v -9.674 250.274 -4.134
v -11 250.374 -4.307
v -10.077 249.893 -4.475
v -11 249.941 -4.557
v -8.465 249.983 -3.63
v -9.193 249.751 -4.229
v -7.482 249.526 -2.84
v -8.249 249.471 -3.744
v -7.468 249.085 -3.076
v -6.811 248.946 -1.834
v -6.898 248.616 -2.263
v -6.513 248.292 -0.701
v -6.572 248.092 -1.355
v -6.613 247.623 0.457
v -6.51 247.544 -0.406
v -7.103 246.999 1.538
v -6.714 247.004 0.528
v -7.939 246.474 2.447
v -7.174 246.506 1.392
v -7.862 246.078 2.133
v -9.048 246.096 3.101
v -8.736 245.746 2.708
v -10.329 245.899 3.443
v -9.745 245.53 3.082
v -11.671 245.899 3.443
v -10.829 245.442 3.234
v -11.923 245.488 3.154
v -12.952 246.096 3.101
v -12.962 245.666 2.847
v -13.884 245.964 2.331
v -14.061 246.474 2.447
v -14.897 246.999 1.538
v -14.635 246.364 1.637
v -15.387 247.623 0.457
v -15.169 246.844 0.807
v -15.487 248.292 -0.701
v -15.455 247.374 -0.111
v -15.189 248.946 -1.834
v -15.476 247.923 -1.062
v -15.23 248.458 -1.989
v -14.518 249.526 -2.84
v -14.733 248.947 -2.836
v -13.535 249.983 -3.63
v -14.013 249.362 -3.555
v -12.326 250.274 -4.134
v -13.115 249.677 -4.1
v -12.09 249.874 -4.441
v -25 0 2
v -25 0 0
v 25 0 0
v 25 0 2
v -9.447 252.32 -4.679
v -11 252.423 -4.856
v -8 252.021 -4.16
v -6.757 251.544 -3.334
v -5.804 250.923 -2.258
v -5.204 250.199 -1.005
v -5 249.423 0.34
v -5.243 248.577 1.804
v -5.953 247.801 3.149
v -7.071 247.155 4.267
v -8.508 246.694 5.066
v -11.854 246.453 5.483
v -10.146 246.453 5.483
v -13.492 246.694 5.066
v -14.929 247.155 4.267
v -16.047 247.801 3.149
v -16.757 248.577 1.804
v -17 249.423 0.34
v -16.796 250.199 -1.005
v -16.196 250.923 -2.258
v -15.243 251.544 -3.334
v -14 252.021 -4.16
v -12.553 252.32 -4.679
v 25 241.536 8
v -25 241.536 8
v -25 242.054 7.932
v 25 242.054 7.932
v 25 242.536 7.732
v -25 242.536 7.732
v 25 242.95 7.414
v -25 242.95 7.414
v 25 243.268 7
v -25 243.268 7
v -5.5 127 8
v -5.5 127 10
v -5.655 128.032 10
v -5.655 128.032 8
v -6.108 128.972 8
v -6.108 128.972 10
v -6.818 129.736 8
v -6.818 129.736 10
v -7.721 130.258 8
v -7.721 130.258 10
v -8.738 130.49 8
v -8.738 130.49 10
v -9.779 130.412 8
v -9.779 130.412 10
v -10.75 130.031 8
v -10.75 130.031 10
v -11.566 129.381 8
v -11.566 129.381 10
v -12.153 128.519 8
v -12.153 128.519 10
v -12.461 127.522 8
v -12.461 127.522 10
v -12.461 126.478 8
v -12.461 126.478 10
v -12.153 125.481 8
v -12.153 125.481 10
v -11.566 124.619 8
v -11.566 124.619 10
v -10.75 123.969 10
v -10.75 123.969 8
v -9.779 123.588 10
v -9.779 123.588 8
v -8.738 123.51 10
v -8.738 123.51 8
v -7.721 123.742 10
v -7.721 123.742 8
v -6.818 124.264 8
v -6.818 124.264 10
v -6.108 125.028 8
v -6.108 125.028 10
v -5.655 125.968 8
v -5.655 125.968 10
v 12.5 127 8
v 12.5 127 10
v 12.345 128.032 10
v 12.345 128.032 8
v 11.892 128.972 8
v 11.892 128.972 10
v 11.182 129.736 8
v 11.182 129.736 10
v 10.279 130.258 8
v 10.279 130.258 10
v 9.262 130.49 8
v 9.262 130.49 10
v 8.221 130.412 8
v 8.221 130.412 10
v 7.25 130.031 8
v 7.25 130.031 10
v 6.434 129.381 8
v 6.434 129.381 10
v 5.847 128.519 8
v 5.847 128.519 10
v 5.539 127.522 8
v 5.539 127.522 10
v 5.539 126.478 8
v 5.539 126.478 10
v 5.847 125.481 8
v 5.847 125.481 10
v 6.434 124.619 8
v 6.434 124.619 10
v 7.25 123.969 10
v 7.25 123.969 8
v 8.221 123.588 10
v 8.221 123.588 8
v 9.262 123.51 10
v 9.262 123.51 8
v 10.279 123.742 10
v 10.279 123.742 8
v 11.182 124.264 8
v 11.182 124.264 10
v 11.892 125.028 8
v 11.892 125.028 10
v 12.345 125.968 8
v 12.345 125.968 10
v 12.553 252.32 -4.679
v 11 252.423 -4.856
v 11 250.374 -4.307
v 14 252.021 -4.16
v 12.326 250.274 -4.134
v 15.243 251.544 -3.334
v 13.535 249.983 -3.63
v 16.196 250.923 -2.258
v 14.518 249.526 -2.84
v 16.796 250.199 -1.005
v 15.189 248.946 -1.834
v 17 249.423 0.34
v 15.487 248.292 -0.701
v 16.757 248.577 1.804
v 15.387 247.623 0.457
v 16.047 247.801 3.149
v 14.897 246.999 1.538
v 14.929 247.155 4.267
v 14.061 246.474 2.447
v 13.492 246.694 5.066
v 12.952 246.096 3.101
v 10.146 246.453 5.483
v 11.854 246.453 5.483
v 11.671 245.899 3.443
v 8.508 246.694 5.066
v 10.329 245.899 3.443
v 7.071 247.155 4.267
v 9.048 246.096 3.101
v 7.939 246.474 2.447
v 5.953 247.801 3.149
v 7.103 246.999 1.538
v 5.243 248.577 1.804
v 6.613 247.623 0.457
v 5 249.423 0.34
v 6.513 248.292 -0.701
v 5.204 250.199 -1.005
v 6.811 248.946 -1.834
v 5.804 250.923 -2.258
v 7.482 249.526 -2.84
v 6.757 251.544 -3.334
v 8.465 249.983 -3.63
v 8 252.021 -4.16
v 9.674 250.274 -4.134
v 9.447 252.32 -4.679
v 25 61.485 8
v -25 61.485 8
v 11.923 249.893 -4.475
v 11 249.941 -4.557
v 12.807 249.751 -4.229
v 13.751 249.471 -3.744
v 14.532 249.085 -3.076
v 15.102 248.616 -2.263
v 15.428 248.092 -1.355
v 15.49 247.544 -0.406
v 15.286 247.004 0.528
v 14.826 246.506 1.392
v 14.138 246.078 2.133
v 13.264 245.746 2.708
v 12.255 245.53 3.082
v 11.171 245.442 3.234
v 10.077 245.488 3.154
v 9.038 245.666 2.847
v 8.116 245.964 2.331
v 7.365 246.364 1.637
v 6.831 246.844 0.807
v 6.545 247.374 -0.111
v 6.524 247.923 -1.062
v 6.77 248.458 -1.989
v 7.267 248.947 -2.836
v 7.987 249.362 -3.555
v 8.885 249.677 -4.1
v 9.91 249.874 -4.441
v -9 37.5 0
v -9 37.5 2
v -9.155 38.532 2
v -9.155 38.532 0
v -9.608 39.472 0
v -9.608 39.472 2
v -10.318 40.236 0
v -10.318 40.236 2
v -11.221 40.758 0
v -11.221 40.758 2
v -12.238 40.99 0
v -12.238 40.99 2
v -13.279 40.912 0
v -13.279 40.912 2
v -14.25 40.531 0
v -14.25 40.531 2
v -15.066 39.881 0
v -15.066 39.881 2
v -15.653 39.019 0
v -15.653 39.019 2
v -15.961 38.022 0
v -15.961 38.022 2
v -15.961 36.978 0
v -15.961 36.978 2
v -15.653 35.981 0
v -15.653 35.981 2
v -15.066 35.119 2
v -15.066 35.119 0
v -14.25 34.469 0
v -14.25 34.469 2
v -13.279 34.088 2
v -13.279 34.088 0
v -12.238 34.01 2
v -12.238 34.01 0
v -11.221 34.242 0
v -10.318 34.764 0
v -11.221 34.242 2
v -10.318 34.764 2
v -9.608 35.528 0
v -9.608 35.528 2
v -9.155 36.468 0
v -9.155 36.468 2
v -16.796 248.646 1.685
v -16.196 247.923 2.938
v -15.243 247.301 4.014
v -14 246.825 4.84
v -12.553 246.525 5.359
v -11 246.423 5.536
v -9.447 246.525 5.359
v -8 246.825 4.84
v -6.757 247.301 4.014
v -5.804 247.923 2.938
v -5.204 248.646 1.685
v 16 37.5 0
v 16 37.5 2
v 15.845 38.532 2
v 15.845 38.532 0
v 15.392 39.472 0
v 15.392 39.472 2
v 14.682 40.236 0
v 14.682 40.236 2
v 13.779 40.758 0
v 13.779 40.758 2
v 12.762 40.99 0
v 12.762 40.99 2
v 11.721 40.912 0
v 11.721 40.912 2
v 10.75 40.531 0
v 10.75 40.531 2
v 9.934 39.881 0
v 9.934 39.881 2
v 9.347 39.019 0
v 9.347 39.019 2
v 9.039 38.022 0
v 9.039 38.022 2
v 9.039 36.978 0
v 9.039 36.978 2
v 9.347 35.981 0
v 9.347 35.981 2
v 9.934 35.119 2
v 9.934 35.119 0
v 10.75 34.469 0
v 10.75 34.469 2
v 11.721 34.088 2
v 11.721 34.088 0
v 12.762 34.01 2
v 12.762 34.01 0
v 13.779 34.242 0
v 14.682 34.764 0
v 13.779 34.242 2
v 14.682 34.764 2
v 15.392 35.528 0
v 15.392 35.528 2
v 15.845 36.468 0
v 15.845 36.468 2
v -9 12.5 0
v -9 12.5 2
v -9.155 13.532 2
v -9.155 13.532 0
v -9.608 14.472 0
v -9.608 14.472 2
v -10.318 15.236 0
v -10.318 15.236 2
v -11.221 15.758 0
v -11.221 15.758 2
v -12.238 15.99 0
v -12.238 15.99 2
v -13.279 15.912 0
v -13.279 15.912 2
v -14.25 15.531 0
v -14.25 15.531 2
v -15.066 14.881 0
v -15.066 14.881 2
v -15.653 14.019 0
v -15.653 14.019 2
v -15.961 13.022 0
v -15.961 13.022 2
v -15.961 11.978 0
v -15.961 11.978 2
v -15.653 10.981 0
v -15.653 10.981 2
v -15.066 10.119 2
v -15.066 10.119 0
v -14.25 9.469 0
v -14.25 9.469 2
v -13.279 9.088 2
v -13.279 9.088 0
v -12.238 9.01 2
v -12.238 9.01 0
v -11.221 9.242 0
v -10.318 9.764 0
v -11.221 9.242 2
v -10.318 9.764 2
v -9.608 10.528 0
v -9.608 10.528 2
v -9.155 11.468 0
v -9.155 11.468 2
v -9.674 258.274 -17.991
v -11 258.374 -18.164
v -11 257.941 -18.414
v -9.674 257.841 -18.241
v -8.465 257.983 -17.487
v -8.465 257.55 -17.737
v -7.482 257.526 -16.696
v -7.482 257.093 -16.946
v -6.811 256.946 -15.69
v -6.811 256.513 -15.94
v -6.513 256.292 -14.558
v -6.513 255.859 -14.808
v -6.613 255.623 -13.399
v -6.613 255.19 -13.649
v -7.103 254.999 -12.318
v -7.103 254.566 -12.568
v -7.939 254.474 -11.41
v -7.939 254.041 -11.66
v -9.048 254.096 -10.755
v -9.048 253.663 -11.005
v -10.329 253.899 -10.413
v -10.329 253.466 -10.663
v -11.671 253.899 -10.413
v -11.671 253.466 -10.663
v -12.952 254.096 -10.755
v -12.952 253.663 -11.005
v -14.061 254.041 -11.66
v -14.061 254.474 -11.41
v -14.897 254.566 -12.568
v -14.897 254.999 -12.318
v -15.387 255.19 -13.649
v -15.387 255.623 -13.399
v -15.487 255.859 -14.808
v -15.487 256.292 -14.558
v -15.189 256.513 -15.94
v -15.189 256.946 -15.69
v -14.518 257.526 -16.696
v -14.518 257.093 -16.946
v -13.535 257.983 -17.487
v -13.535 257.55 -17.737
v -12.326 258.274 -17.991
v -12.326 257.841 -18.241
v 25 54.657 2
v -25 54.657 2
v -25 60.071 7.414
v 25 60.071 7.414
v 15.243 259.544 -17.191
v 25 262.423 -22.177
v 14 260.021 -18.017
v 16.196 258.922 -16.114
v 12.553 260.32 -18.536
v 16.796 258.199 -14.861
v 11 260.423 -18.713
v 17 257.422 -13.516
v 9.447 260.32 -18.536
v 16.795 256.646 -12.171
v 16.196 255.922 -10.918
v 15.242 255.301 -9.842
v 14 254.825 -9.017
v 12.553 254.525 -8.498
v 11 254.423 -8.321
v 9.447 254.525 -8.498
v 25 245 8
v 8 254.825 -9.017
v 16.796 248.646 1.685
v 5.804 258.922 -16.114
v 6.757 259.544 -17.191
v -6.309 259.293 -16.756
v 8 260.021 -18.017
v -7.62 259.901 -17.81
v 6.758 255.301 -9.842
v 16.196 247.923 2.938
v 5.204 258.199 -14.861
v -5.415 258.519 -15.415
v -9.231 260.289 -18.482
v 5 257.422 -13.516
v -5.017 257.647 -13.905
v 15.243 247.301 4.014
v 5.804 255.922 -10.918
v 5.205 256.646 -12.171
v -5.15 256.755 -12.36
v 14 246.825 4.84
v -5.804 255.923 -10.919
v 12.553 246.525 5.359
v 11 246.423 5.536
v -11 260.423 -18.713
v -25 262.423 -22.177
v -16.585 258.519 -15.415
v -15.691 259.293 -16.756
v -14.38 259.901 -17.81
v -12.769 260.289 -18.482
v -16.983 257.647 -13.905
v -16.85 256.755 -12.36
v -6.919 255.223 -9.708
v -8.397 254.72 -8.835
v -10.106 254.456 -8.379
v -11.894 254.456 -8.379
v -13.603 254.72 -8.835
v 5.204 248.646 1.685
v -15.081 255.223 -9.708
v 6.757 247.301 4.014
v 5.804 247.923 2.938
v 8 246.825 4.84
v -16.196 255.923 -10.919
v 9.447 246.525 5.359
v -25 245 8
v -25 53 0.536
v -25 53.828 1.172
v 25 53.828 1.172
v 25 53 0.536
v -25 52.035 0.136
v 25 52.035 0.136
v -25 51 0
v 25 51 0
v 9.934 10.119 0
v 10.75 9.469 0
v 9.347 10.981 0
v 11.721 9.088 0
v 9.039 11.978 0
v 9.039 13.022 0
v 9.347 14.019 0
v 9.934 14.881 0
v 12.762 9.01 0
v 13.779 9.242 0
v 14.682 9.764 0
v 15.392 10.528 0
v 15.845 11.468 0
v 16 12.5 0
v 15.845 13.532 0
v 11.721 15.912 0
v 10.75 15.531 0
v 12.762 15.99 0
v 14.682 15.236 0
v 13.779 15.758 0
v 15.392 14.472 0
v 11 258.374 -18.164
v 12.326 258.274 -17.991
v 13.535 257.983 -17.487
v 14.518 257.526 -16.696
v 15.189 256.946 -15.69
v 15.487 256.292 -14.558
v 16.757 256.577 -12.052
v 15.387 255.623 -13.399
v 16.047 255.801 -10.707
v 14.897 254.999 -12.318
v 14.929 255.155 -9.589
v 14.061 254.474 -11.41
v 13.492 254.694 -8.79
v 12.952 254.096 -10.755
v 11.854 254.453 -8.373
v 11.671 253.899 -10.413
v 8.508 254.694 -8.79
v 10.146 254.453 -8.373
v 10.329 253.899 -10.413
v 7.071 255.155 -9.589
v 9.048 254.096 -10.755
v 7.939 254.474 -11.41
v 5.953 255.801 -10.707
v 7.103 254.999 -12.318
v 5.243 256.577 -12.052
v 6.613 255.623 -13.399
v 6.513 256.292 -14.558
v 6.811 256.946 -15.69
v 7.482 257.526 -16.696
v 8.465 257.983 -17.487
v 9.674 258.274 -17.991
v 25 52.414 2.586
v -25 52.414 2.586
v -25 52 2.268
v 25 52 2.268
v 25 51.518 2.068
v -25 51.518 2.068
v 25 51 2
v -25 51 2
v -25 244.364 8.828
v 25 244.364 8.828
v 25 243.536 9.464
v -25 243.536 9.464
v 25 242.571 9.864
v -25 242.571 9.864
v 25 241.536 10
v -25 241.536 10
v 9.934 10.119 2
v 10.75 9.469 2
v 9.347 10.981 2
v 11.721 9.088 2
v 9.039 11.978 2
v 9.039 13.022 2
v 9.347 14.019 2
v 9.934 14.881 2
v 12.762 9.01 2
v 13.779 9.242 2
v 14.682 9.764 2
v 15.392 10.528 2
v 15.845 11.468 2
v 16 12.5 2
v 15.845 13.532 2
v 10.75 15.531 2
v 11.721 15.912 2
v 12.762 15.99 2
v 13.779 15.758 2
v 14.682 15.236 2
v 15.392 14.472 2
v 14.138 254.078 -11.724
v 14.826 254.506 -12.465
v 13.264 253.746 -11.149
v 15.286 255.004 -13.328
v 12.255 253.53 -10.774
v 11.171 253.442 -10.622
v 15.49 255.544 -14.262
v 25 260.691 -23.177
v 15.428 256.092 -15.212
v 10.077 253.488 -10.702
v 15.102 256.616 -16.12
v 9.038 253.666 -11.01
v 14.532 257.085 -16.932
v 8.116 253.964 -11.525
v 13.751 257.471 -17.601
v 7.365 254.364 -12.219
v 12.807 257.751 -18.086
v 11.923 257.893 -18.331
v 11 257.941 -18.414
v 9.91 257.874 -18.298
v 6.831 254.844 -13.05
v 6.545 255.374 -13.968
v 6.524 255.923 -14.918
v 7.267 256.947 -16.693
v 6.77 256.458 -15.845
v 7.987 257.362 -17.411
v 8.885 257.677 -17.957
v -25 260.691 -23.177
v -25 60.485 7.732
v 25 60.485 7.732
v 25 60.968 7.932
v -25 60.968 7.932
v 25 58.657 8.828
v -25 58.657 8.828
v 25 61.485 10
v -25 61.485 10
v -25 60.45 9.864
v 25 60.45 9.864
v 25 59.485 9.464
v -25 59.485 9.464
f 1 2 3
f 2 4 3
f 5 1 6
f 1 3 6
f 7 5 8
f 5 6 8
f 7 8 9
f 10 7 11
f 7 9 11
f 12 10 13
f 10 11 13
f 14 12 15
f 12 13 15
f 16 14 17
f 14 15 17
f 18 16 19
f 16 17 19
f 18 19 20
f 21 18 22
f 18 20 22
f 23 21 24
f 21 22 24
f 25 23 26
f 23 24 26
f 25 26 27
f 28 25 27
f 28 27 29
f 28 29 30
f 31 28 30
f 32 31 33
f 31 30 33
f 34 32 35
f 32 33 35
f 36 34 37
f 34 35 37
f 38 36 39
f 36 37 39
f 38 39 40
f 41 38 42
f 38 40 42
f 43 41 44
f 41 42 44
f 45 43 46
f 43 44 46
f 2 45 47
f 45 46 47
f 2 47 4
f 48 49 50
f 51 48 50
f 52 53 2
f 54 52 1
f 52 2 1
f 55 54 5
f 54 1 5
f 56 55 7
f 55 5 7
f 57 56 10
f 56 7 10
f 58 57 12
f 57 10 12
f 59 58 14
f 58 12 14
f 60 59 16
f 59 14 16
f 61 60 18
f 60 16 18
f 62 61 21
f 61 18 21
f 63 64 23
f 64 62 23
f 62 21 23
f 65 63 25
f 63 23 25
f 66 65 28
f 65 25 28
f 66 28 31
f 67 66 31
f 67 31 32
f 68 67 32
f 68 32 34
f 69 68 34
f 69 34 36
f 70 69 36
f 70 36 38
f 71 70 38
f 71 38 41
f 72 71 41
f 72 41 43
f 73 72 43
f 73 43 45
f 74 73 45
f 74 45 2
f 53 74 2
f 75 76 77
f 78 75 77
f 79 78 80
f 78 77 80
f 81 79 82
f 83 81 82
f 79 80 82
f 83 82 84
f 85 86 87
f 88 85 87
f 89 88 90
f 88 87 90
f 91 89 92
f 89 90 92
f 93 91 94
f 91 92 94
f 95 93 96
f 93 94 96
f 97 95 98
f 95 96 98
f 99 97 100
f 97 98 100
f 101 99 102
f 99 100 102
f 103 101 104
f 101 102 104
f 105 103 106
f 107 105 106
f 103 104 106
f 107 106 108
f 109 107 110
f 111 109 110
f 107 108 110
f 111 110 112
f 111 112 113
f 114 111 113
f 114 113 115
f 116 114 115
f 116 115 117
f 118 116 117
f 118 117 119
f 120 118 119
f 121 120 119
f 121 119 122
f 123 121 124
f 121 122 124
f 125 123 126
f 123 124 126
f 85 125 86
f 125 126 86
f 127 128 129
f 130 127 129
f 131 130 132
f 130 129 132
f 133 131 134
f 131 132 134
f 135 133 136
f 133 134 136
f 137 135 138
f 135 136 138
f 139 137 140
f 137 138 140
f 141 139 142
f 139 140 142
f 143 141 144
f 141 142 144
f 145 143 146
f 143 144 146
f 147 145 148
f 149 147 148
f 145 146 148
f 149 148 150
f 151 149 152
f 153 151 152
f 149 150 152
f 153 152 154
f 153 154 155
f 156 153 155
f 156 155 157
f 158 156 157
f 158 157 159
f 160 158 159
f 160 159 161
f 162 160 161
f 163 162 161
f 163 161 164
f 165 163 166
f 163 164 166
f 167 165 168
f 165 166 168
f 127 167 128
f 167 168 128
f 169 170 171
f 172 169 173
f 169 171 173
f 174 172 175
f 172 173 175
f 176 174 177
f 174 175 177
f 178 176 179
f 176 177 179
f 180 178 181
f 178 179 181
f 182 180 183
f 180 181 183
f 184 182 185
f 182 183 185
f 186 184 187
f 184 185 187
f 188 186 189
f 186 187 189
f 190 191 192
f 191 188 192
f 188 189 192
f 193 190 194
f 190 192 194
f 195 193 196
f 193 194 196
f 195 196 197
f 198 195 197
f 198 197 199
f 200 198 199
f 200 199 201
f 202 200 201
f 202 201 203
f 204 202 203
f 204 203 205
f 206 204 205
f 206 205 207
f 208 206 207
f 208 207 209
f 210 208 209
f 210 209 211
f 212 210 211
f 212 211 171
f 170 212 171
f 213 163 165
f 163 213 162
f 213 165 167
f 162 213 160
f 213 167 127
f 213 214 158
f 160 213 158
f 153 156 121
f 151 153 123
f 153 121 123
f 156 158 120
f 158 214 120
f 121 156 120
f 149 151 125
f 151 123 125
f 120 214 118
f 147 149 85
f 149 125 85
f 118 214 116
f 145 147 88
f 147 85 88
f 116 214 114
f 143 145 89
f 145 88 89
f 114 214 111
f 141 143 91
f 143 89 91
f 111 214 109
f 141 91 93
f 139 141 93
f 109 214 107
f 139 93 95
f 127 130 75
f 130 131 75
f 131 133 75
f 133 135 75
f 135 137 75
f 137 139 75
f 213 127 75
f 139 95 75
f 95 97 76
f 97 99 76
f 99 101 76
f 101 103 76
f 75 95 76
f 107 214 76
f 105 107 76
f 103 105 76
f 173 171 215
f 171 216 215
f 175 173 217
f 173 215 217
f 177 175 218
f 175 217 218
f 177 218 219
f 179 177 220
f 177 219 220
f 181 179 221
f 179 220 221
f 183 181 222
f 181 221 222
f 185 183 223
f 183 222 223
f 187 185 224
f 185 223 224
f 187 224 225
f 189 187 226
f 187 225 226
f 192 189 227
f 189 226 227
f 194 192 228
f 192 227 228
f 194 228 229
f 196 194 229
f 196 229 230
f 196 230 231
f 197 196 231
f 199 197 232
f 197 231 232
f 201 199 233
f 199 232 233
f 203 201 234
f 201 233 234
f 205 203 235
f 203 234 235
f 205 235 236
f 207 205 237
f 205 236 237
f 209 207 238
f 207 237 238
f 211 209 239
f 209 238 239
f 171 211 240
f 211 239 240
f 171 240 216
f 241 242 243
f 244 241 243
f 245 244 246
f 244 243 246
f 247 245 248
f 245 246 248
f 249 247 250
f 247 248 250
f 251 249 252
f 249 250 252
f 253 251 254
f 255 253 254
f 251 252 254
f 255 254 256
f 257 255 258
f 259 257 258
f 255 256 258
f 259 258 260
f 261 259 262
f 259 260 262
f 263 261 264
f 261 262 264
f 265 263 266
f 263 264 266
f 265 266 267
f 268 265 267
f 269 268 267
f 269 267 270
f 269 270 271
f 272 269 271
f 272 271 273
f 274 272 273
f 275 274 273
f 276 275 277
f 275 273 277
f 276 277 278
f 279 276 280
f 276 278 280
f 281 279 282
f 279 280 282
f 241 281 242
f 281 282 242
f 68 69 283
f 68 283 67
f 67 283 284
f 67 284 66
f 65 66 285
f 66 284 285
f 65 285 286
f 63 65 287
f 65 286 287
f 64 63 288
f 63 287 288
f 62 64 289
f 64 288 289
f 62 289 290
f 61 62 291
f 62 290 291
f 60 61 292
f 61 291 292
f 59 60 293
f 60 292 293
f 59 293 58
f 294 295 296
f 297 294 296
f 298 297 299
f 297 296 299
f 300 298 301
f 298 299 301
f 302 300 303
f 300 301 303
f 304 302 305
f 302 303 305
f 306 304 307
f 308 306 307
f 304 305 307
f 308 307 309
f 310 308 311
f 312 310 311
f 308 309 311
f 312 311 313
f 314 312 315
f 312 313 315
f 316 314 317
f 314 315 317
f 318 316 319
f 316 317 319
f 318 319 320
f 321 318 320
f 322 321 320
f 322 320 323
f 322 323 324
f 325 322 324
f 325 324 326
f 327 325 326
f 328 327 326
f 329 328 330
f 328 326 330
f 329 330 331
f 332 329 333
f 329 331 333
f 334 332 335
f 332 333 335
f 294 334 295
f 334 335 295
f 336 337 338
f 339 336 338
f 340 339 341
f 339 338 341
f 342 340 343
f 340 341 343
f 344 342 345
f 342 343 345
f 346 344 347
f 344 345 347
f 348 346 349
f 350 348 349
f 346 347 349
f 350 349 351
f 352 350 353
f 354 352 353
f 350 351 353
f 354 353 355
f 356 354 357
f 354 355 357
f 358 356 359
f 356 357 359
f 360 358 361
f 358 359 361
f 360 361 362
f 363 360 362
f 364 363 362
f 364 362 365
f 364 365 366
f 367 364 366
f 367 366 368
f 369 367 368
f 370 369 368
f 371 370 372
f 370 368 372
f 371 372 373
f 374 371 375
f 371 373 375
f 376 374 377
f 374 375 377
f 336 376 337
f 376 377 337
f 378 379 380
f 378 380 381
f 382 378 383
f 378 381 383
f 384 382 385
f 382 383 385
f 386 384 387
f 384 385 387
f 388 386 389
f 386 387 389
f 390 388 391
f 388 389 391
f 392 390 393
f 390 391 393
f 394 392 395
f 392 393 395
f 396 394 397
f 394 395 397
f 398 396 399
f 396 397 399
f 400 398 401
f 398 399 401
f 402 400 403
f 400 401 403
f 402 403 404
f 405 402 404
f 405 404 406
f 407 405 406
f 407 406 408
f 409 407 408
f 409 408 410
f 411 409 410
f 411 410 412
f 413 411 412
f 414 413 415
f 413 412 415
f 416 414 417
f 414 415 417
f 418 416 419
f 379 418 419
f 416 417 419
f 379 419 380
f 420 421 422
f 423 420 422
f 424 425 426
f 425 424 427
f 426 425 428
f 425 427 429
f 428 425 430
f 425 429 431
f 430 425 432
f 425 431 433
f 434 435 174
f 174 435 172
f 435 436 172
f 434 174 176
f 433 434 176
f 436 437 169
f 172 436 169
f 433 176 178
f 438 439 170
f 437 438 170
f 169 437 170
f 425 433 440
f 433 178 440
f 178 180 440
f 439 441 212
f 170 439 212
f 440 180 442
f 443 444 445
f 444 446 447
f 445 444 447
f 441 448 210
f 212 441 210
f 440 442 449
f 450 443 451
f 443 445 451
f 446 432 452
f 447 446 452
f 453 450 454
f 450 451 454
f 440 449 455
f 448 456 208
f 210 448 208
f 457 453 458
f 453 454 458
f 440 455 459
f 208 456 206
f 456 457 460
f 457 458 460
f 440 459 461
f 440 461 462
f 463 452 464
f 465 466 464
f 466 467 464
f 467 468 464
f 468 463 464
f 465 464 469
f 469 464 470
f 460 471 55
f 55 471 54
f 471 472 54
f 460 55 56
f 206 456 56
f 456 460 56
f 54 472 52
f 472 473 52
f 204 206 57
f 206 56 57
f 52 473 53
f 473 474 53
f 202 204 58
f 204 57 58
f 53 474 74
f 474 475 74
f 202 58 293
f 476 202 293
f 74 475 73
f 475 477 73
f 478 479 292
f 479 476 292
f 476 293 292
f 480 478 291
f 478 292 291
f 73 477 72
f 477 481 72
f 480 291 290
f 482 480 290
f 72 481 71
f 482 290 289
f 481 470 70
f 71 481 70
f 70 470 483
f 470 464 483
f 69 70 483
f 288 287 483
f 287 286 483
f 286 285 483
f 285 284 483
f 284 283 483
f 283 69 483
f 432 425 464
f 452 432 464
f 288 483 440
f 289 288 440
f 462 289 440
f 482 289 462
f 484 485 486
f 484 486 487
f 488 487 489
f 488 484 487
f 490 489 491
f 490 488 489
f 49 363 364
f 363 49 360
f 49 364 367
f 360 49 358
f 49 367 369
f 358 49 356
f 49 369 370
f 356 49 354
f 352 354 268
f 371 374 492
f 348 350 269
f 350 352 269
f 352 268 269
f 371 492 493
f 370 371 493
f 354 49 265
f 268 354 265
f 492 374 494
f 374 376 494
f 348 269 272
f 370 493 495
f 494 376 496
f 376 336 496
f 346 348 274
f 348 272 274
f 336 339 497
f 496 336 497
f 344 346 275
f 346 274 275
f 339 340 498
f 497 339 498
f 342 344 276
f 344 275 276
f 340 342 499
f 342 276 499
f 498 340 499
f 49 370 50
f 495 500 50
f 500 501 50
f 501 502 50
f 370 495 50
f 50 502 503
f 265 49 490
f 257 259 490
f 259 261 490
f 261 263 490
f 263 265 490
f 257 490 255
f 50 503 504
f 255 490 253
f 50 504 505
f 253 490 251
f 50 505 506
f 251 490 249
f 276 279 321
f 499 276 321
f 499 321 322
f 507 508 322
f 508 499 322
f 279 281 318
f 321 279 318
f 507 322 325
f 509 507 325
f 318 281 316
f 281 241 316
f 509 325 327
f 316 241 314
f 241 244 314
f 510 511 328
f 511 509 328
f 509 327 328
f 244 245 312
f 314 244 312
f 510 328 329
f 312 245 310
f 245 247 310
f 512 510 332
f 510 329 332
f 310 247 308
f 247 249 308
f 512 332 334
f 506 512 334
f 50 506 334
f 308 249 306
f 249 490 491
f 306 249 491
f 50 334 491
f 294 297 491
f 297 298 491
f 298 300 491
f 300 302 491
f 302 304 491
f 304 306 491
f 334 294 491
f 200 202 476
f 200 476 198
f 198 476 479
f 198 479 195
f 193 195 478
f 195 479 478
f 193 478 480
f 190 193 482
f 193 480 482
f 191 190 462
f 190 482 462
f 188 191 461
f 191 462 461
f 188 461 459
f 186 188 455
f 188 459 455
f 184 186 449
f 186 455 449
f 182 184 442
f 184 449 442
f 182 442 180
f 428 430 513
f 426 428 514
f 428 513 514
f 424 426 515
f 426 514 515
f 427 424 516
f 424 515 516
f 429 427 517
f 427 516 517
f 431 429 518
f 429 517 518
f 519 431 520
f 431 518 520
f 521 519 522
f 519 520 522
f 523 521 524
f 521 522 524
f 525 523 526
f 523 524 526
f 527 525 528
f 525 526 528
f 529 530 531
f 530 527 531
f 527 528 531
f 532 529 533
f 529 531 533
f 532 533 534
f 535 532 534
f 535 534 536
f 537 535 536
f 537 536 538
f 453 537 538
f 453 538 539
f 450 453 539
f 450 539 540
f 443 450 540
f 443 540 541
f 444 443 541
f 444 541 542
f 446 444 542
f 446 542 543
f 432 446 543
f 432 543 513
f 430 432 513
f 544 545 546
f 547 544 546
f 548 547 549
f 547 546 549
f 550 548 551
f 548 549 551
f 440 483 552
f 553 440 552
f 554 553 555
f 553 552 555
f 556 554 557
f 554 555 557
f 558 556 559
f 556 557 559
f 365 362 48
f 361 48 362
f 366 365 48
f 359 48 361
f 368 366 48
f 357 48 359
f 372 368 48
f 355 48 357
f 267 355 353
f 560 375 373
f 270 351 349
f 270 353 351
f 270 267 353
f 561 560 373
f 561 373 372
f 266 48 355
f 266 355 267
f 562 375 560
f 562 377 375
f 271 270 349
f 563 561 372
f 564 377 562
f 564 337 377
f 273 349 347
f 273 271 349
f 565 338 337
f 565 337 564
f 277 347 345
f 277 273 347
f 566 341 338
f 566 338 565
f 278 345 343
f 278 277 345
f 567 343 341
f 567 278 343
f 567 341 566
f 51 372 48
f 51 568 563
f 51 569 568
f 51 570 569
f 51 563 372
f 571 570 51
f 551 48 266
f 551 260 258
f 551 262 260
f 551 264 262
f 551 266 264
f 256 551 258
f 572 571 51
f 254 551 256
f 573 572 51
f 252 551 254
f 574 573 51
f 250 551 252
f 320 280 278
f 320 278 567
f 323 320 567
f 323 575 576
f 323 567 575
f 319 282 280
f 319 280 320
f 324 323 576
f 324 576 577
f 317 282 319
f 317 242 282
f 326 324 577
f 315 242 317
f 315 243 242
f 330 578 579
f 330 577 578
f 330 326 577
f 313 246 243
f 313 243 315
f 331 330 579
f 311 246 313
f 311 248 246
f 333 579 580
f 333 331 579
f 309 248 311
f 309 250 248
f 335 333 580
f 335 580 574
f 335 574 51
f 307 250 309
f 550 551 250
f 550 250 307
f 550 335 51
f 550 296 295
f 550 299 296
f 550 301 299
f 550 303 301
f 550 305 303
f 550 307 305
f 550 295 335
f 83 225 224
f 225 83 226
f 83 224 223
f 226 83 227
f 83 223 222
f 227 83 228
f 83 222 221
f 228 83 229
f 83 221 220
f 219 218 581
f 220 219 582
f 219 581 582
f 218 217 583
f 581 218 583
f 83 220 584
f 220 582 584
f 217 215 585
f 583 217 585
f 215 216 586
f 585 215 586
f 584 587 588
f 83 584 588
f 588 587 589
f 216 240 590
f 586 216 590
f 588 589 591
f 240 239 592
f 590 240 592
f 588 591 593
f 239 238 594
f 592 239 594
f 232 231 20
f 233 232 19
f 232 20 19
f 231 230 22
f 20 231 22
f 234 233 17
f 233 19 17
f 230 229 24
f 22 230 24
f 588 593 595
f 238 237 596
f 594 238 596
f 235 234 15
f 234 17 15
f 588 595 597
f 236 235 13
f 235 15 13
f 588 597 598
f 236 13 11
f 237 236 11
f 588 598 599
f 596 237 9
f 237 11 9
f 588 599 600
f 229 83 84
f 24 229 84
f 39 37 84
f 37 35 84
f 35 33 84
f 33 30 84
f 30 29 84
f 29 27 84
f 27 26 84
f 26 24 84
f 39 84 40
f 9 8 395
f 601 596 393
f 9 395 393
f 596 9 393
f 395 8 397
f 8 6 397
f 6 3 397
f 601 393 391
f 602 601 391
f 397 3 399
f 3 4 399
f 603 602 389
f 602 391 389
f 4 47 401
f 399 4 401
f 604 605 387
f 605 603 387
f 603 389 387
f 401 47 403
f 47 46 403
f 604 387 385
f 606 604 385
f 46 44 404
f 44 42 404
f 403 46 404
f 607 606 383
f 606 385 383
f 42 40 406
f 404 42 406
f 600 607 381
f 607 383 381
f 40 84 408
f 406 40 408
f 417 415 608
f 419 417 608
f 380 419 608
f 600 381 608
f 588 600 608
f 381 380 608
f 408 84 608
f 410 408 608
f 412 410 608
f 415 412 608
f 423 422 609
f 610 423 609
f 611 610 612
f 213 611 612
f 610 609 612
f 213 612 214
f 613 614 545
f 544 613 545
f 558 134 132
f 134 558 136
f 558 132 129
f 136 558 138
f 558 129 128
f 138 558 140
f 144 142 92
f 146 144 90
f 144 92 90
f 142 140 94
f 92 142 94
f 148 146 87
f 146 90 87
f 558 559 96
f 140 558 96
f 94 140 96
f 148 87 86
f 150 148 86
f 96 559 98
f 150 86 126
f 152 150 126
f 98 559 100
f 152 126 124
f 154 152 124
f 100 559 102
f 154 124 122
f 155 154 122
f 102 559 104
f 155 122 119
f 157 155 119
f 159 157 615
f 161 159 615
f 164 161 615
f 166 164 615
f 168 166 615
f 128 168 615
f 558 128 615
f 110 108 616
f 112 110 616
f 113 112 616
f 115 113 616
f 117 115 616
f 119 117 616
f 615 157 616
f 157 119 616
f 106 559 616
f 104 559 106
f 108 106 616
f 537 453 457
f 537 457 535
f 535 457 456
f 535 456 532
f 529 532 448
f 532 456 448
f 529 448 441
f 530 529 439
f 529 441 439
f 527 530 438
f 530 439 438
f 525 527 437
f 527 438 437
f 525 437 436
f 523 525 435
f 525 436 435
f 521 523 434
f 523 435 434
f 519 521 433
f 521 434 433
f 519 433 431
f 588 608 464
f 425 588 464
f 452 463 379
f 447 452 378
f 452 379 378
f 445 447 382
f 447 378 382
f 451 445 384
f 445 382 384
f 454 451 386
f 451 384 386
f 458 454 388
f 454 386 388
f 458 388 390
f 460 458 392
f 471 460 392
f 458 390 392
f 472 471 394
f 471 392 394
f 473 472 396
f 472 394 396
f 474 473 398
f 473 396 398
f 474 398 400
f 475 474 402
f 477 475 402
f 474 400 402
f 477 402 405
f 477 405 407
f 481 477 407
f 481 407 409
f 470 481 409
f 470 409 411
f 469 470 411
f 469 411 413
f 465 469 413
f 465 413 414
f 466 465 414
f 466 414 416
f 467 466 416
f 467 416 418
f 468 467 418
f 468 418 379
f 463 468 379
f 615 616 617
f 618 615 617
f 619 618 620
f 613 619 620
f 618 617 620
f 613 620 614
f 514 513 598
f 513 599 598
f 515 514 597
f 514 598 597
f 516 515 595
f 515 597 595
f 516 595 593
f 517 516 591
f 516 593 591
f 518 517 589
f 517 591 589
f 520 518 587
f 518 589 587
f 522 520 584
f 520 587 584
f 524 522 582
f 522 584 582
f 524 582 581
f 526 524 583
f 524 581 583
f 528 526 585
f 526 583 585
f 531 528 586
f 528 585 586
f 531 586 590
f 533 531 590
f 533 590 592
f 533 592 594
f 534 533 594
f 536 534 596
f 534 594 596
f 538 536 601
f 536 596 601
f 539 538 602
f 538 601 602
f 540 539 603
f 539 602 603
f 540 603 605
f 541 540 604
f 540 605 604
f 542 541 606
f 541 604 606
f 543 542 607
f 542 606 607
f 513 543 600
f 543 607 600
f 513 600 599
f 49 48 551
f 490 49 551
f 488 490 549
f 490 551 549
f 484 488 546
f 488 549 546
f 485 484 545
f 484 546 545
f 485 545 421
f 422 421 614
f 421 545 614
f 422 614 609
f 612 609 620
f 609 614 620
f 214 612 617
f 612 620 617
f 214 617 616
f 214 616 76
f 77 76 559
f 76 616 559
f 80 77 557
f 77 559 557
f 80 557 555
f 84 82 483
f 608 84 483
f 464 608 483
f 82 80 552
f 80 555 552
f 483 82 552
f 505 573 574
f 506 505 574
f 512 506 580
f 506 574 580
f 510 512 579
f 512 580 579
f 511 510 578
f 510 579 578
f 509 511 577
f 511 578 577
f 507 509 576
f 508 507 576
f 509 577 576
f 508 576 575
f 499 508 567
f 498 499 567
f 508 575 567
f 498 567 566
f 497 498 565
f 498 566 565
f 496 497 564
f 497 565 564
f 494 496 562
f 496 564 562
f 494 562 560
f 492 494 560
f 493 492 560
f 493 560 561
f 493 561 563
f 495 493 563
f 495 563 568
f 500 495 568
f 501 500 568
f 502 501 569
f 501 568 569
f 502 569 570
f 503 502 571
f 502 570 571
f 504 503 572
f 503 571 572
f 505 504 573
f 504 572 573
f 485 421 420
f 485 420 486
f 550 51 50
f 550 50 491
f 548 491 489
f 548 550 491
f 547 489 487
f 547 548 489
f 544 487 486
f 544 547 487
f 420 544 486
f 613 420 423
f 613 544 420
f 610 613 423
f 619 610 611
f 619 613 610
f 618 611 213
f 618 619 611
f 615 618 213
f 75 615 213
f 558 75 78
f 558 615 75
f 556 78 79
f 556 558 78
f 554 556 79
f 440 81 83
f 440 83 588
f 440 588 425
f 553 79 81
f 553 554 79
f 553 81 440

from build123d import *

# Parameters (mm, degrees)
SKETCH_1_W                            = 50
SKETCH_1_H                            = 245
SM_BASE_FLANGE_1_DEPTH                = 2
SM_START                              = -25
SM_EDGE_FLANGE_1_DEPTH                = 50
SM_EDGE_FLANGE_1_2_DEPTH              = 50
OTHER_START                           = -25
OTHER_1_DEPTH                         = 50
OTHER_1_2_DEPTH                       = 50
HOLE_WIZARD_M61_D                     = 9
HOLE_WIZARD_M61_CSINK_D               = 12
HOLE_WIZARD_M61_CSINK_ANGLE           = 90
HOLE_WIZARD_M61_ON_FACE_2_D           = 9
HOLE_WIZARD_M61_ON_FACE_2_CSINK_D     = 12
HOLE_WIZARD_M61_ON_FACE_2_CSINK_ANGLE = 90
HOLE_WIZARD_M61_ON_FACE_3_D           = 9
HOLE_WIZARD_M61_ON_FACE_3_CSINK_D     = 12
HOLE_WIZARD_M61_ON_FACE_3_CSINK_ANGLE = 90
SKETCH_9_R                            = 3.5
CUT_EXTRUDE_1_DEPTH                   = 2
SKETCH_10_R                           = 3.5
CUT_EXTRUDE_2_DEPTH                   = 2


# Read off the part's stored shape, not the designer's step: Ребро-кромка1, Изгиб1
# Sheet-metal steps are written as plain solids
with BuildPart() as part:
    # Sketch 1 → Базовая кромка1 (new body)
    with BuildSketch(Plane.XY):
        with Locations((0, 122.5)):
            Rectangle(SKETCH_1_W, SKETCH_1_H)
    extrude(amount=SM_BASE_FLANGE_1_DEPTH)

    # Ребро-кромка1 outline → Ребро-кромка1 (cut)
    with BuildSketch(Plane.YZ.offset(SM_START)):
        with BuildLine():
            ThreePointArc((241.535898385, 2), (243.535898385, 1.464101615), (245, 0))
            Line((245, 0), (245, 2))
            Line((245, 2), (241.535898385, 2))
        make_face()
    extrude(amount=SM_EDGE_FLANGE_1_DEPTH, mode=Mode.SUBTRACT)

    # Sm Edge Flange 1 2 outline → Sm Edge Flange 1 2 (add)
    with BuildSketch(Plane.YZ.offset(SM_START)):
        with BuildLine():
            Line((262.422649731, -30.176914536), (245, 0))
            Line((245, 0), (241.535898385, 0))
            ThreePointArc((241.535898385, 0), (242.535898385, -0.267949192), (243.267949192, -1))
            Line((243.267949192, -1), (260.690598923, -31.176914536))
            Line((260.690598923, -31.176914536), (262.422649731, -30.176914536))
        make_face()
    extrude(amount=SM_EDGE_FLANGE_1_2_DEPTH)

    # Other 1 outline → Other 1 (cut)
    with BuildSketch(Plane.YZ.offset(OTHER_START)):
        with BuildLine():
            Line((241.535898385, 2), (54.65685425, 2))
            Line((54.65685425, 2), (53.82842715, 1.17157285))
            ThreePointArc((53.82842715, 1.17157285), (52.530733743, 0.304481837), (51, -3.6e-08))
            Line((51, -3.6e-08), (241.535898385, 0))
            ThreePointArc((241.535898385, 0), (242.535898385, -0.267949192), (243.267949192, -1))
            Line((243.267949192, -1), (260.690598923, -31.176914536))
            Line((260.690598923, -31.176914536), (262.422649731, -30.176914536))
            Line((262.422649731, -30.176914536), (245, 0))
            ThreePointArc((245, 0), (243.535898385, 1.464101615), (241.535898385, 2))
        make_face()
    extrude(amount=OTHER_1_DEPTH, mode=Mode.SUBTRACT)

    # Other 1 2 outline → Other 1 2 (add)
    with BuildSketch(Plane.YZ.offset(OTHER_START)):
        with BuildLine():
            Line((241.535898385, 10), (61.485281398, 10.000000033))
            ThreePointArc((61.485281398, 10.000000033), (59.954547643, 9.695518165), (58.656854226, 8.828427148))
            Line((58.656854226, 8.828427148), (52.414213588, 2.585786412))
            ThreePointArc((52.414213588, 2.585786412), (51.765366878, 2.152240902), (51, 1.999999964))
            Line((51, 1.999999964), (54.65685425, 2))
            Line((54.65685425, 2), (60.071067788, 7.414213586))
            ThreePointArc((60.071067788, 7.414213586), (60.719914496, 7.847759096), (61.485281374, 8.000000033))
            Line((61.485281374, 8.000000033), (241.535898385, 8))
            ThreePointArc((241.535898385, 8), (242.535898385, 7.732050808), (243.267949192, 7))
            Line((243.267949192, 7), (260.690598923, -23.176914536))
            Line((260.690598923, -23.176914536), (262.422649731, -22.176914536))
            Line((262.422649731, -22.176914536), (245, 8))
            ThreePointArc((245, 8), (243.535898385, 9.464101615), (241.535898385, 10))
        make_face()
    extrude(amount=OTHER_1_2_DEPTH)

    # Зенковка для винта с потайной головкой M61 (through all)
    with Locations(Plane(origin=(-11, 257.422649731, -13.516660498), x_dir=(0, -0.5, 0.866025403784), z_dir=(0, 0.866025403784, 0.5))):
        with Locations((0, 0)):
            CounterSinkHole(HOLE_WIZARD_M61_D / 2, HOLE_WIZARD_M61_CSINK_D / 2, counter_sink_angle=HOLE_WIZARD_M61_CSINK_ANGLE)

    # Зенковка для винта с потайной головкой M61 on face 2 (through all)
    with Locations(Plane(origin=(11, 257.422649731, -13.516660498), x_dir=(0, -0.500000174844, 0.866025302838), z_dir=(0, 0.866025302838, 0.500000174844))):
        with Locations((0, 0)):
            CounterSinkHole(HOLE_WIZARD_M61_ON_FACE_2_D / 2, HOLE_WIZARD_M61_ON_FACE_2_CSINK_D / 2, counter_sink_angle=HOLE_WIZARD_M61_ON_FACE_2_CSINK_ANGLE)

    # Зенковка для винта с потайной головкой M61 on face 3 (through all)
    with Locations(Plane(origin=(11, 249.422649731, 0.339745962), x_dir=(0, -0.500000174844, 0.866025302838), z_dir=(0, 0.866025302838, 0.500000174844))):
        with Locations((0, 0), (0, -22)):
            CounterSinkHole(HOLE_WIZARD_M61_ON_FACE_3_D / 2, HOLE_WIZARD_M61_ON_FACE_3_CSINK_D / 2, counter_sink_angle=HOLE_WIZARD_M61_ON_FACE_3_CSINK_ANGLE)

    # Эскиз9 → Вытянуть1 (cut)
    with BuildSketch(Plane.XY.offset(2)):
        with Locations((-12.5, 37.5)):
            Circle(SKETCH_9_R)
        with Locations((-12.5, 12.5)):
            Circle(SKETCH_9_R)
        with Locations((12.5, 12.5)):
            Circle(SKETCH_9_R)
        with Locations((12.5, 37.5)):
            Circle(SKETCH_9_R)
    extrude(amount=-CUT_EXTRUDE_1_DEPTH, mode=Mode.SUBTRACT)

    # Эскиз10 → Вытянуть2 (cut)
    with BuildSketch(Plane.XY.offset(10)):
        with Locations((-9, 127)):
            Circle(SKETCH_10_R)
        with Locations((9, 127)):
            Circle(SKETCH_10_R)
    extrude(amount=-CUT_EXTRUDE_2_DEPTH, mode=Mode.SUBTRACT)


solid = part.part
